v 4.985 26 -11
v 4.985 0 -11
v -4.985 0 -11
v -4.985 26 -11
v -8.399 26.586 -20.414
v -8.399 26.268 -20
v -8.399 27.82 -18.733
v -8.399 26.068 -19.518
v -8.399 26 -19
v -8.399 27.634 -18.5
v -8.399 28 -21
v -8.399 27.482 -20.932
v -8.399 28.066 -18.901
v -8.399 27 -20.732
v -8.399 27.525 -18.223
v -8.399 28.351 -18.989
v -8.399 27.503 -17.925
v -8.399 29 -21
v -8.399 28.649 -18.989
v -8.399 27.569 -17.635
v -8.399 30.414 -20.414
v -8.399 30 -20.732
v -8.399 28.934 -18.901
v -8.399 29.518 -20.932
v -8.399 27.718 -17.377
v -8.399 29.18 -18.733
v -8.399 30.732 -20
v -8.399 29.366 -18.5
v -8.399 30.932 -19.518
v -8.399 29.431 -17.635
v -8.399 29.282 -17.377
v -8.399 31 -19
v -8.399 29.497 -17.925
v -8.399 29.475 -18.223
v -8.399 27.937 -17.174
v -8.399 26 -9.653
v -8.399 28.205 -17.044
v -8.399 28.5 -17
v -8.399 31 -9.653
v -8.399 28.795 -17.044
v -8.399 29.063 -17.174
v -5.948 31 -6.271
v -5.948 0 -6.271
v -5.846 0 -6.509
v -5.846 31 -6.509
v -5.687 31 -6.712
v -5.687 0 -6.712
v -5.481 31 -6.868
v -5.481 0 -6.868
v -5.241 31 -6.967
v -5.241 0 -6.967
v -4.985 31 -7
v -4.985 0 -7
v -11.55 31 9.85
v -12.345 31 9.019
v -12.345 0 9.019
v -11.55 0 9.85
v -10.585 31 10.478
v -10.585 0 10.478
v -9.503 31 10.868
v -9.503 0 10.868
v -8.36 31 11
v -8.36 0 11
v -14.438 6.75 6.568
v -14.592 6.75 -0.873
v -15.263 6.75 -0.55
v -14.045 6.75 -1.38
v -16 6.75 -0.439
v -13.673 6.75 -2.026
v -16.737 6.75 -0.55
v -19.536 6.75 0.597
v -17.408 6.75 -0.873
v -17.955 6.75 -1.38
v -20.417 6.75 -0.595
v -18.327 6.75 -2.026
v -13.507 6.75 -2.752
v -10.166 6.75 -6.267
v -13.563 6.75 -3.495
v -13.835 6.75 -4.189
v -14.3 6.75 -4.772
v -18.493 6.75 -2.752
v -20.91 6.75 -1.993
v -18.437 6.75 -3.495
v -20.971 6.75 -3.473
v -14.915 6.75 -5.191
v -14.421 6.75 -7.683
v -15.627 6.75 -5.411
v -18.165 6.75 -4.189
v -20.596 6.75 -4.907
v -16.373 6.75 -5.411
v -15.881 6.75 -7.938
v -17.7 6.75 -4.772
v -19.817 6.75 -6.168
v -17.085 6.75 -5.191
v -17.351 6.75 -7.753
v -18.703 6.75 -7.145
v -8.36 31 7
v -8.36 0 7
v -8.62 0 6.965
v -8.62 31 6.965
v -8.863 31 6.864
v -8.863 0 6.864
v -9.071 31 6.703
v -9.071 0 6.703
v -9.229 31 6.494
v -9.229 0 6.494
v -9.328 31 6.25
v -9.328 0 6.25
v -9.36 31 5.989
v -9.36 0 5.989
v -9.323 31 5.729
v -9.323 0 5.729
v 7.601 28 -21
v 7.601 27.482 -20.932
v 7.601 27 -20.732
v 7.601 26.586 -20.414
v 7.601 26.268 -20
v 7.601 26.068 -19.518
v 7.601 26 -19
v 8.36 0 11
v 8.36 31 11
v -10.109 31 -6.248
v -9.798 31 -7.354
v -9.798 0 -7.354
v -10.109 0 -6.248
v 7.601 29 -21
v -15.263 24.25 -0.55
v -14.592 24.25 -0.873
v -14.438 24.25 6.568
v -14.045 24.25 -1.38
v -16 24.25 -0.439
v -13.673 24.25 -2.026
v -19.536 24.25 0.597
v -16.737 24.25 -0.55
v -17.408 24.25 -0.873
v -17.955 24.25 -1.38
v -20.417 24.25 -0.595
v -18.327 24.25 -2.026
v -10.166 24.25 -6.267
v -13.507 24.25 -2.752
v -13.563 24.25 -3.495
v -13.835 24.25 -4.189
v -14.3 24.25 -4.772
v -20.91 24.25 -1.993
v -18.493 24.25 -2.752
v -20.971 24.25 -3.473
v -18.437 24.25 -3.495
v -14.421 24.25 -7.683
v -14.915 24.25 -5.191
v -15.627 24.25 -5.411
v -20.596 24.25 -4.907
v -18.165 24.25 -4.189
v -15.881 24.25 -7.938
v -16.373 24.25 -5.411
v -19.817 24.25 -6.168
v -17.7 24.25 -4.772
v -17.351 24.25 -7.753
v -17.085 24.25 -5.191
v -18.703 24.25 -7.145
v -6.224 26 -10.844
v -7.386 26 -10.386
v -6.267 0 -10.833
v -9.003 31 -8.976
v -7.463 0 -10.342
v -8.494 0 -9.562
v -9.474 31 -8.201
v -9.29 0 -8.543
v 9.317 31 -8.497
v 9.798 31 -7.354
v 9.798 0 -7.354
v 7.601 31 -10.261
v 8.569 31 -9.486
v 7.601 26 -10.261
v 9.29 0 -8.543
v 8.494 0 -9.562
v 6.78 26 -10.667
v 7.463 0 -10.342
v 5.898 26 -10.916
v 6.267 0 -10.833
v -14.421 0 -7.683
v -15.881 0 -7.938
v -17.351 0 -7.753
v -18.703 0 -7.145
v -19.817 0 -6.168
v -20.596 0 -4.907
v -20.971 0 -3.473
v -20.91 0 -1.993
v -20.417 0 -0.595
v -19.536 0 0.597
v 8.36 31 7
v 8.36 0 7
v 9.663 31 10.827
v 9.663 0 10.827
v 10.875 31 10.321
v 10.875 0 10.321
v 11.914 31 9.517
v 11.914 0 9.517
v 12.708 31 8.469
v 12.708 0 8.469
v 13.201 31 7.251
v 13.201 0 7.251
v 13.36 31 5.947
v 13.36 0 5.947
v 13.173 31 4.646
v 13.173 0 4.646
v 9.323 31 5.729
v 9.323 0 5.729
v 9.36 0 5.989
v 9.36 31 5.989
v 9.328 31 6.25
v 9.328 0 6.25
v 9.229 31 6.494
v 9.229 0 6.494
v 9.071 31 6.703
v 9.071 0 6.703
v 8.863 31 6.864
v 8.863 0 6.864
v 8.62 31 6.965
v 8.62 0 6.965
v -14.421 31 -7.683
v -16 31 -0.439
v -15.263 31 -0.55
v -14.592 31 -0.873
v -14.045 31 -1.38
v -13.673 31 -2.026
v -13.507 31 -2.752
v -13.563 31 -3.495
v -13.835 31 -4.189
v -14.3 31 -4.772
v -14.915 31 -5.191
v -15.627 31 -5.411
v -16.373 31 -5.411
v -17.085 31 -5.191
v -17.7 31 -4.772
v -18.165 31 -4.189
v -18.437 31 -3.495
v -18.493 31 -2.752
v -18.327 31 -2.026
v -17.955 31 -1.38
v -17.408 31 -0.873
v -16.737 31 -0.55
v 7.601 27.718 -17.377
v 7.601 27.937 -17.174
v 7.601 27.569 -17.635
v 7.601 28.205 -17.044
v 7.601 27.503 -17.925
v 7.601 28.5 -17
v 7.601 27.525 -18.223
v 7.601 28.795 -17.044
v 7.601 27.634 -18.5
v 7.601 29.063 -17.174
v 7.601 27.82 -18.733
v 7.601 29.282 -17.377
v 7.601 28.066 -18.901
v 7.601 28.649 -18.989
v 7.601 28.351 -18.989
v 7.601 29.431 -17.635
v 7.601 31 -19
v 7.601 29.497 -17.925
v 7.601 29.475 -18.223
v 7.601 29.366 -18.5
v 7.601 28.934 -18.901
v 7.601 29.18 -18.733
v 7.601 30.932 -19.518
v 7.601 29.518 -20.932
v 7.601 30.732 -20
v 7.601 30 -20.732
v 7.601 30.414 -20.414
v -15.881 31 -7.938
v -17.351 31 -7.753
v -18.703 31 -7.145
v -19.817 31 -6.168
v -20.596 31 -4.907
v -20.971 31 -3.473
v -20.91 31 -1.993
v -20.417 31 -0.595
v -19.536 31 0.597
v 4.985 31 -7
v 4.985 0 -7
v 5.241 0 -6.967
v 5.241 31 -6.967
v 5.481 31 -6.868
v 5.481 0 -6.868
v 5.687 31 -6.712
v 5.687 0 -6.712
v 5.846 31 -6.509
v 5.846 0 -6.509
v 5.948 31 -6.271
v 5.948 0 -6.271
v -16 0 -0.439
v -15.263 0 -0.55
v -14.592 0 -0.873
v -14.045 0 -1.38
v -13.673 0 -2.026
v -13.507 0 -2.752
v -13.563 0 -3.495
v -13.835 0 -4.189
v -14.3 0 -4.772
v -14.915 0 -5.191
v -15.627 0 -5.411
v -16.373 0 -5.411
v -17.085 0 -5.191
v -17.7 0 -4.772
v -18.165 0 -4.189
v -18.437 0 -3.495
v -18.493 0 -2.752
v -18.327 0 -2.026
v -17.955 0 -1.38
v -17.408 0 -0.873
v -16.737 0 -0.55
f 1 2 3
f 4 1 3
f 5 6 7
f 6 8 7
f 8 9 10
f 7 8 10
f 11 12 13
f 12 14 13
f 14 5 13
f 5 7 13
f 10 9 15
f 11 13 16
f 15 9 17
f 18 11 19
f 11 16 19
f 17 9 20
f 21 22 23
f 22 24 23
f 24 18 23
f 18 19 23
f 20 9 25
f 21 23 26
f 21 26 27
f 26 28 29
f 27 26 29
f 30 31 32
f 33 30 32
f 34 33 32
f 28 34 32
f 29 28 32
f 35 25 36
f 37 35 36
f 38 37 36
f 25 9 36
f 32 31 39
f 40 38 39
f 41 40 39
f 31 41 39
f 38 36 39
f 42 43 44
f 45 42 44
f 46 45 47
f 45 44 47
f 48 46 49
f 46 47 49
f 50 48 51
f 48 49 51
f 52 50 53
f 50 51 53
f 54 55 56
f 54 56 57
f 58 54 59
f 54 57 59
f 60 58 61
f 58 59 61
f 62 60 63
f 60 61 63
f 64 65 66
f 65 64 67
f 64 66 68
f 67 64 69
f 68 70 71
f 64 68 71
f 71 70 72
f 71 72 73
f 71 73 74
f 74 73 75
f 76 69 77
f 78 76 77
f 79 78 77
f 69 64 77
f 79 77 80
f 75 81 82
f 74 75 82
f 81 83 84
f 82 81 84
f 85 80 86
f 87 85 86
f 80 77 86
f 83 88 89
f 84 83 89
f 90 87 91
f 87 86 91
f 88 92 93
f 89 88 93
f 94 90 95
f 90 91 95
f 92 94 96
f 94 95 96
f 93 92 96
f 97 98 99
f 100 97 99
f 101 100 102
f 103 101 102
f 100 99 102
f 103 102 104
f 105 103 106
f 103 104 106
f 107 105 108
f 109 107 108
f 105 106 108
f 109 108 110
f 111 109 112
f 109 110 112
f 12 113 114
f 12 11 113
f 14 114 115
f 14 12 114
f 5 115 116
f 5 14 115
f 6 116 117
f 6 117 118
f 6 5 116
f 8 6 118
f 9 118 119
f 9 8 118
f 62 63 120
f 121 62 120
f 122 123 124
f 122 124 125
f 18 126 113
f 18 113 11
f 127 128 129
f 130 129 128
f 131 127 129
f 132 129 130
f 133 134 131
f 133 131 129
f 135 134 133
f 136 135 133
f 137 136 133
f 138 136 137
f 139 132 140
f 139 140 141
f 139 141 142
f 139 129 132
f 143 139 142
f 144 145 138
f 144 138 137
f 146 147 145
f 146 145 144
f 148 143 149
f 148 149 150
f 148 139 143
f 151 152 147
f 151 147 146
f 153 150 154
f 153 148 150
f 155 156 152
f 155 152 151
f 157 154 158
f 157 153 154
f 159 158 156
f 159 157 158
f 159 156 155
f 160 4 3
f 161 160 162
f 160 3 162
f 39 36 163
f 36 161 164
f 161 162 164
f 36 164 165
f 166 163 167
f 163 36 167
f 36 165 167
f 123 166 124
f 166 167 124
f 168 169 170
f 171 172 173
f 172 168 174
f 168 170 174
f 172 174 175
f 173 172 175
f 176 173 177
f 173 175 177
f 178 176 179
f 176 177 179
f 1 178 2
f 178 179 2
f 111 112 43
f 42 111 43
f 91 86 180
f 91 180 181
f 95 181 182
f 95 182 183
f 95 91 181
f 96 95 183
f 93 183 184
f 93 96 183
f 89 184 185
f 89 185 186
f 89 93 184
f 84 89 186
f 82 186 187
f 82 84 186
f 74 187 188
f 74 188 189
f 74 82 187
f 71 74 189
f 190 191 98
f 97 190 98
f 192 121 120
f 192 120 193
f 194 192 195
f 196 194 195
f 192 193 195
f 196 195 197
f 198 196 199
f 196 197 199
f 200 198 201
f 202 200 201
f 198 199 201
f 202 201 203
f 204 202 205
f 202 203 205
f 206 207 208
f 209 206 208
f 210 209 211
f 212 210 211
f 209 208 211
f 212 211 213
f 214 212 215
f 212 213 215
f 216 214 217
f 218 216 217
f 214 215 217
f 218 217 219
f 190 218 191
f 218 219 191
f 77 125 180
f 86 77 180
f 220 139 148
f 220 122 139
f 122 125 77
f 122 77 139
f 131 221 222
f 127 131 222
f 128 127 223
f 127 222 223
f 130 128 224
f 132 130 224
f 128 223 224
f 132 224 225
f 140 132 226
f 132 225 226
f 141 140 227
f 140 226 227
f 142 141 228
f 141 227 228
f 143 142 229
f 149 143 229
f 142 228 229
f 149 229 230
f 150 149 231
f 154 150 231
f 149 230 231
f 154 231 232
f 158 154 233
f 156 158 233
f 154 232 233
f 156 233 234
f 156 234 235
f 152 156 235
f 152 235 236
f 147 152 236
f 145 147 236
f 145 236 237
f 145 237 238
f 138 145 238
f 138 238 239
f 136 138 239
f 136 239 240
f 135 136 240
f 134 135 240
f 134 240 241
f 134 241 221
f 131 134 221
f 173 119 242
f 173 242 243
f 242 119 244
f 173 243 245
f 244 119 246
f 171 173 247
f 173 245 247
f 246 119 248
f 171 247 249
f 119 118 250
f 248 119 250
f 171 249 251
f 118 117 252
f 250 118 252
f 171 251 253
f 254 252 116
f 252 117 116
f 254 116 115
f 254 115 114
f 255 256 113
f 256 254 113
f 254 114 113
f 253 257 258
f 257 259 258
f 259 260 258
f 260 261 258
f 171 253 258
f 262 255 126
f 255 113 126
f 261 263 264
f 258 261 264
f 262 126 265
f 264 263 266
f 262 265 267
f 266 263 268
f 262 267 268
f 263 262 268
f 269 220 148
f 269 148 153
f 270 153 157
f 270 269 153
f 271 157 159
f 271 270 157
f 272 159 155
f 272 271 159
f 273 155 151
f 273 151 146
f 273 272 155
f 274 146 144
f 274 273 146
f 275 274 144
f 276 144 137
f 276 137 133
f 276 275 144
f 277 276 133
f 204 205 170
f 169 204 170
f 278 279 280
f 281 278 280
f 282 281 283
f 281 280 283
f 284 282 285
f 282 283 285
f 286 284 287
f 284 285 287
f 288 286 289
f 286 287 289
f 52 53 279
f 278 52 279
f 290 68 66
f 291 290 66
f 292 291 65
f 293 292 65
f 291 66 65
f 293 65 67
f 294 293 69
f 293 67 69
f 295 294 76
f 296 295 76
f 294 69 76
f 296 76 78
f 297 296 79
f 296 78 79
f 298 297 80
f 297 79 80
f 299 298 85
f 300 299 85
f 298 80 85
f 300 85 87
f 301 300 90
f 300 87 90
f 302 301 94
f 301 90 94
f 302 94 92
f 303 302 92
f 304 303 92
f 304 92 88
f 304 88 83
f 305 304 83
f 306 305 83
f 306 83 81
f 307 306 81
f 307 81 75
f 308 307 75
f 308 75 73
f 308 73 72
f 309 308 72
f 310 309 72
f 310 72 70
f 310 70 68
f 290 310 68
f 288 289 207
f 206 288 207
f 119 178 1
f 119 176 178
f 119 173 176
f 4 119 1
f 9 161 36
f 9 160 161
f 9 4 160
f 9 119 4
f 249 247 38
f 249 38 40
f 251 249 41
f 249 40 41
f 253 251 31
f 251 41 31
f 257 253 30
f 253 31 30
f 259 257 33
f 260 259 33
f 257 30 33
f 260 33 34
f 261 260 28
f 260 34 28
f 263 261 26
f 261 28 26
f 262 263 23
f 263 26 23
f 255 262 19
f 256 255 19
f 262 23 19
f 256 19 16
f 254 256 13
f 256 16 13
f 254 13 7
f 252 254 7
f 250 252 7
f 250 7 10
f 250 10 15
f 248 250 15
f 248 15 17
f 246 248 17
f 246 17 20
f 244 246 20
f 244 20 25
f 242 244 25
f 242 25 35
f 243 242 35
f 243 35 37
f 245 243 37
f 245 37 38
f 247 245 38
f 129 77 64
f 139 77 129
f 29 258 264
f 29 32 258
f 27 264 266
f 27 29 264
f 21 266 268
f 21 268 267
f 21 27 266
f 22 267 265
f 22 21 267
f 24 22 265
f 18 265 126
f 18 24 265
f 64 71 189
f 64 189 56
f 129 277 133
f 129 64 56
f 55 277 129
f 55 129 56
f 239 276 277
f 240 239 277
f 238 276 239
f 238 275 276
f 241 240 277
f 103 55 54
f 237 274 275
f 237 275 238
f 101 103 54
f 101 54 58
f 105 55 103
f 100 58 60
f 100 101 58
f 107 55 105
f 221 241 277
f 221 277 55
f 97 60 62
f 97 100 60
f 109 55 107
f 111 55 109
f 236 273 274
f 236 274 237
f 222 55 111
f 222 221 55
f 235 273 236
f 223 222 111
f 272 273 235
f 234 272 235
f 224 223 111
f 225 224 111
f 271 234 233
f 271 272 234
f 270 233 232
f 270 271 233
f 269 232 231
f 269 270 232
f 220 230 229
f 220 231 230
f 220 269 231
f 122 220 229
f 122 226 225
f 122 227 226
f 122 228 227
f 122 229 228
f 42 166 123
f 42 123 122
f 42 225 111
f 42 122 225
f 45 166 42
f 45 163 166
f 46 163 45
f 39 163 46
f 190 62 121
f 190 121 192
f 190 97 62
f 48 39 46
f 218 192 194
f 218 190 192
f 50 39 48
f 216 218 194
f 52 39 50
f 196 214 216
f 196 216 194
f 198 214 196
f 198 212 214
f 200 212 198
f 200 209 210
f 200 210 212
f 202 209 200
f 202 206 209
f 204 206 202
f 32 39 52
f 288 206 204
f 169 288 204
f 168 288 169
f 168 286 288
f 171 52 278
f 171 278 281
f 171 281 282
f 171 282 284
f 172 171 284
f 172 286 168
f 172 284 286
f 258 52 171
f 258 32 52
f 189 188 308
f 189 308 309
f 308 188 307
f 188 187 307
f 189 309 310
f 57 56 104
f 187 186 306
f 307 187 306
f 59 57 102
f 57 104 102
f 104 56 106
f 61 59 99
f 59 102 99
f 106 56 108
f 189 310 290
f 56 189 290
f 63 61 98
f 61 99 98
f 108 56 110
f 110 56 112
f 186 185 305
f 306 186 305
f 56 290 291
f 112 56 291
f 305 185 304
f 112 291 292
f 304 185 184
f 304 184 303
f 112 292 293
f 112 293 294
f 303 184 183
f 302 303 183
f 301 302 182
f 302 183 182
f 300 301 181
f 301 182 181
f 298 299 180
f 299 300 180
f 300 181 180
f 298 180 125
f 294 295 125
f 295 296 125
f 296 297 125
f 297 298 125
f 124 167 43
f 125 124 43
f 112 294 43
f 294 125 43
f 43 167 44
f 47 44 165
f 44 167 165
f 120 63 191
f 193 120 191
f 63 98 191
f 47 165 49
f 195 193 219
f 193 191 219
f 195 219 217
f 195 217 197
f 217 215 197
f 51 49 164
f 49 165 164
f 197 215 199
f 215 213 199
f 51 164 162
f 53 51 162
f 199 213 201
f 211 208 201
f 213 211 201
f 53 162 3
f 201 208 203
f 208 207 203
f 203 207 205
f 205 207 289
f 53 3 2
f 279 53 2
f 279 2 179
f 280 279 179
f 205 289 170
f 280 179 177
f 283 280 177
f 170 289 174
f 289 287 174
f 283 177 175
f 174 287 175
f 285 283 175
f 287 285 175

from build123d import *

# Parameters (mm, degrees)
BOSS_EXTRUDE1_DEPTH             = 31
SKETCH2_W                       = 16
SKETCH2_H                       = 5
BOSS_EXTRUDE2_DEPTH             = 10
BOSS_EXTRUDE2_DIRECTION_2_REACH = 42.293
SKETCH3_R                       = 1
CUT_EXTRUDE1_DEPTH              = 44.306250579
FILLET1_R                       = 2
SKETCH4_R                       = 2.5
BOSS_EXTRUDE3_DEPTH             = 31
SKETCH6_W                       = 18.969126519
SKETCH6_H                       = 17.5
CUT_EXTRUDE2_DEPTH              = 43.163504997


with BuildPart() as part:
    # Sketch1 → Boss-Extrude1 (new body)
    with BuildSketch(Plane(origin=(0, 0, 0), x_dir=(1, 0, 0), z_dir=(0, 1, 0))):
        with BuildLine():
            Line((-8.359903733, -11), (8.359903733, -11))
            ThreePointArc((8.359903733, -11), (12.345417465, -9.01921849), (13.173158433, -4.646272115))
            Line((13.173158433, -4.646272115), (9.798158433, 7.353727885))
            ThreePointArc((9.798158433, 7.353727885), (8.004122222, 9.985513732), (4.984903733, 11))
            Line((4.984903733, 11), (-4.984903733, 11))
            ThreePointArc((-4.984903733, 11), (-8.004122222, 9.985513732), (-9.798158433, 7.353727885))
            Line((-9.798158433, 7.353727885), (-13.173158433, -4.646272115))
            ThreePointArc((-13.173158433, -4.646272115), (-12.345417465, -9.01921849), (-8.359903733, -11))
        make_face()
        with BuildLine():
            Line((5.947554673, 6.270745577), (9.322554673, -5.729254423))
            ThreePointArc((9.322554673, -5.729254423), (9.157006479, -6.603843698), (8.359903733, -7))
            Line((8.359903733, -7), (-8.359903733, -7))
            ThreePointArc((-8.359903733, -7), (-9.157006479, -6.603843698), (-9.322554673, -5.729254423))
            Line((-9.322554673, -5.729254423), (-5.947554673, 6.270745577))
            ThreePointArc((-5.947554673, 6.270745577), (-5.588747431, 6.797102746), (-4.984903733, 7))
            Line((-4.984903733, 7), (4.984903733, 7))
            ThreePointArc((4.984903733, 7), (5.588747431, 6.797102746), (5.947554673, 6.270745577))
        make_face(mode=Mode.SUBTRACT)
    extrude(amount=BOSS_EXTRUDE1_DEPTH)

    # Sketch2 → Boss-Extrude2 (add)
    with BuildSketch(Plane(origin=(0, 0, -11), x_dir=(-1, 0, 0), z_dir=(0, 0, -1))):
        with Locations((0.398573677, 28.5)):
            Rectangle(SKETCH2_W, SKETCH2_H)
    extrude(amount=BOSS_EXTRUDE2_DEPTH)

    # Boss-Extrude2 direction 2: up to this face of the body (flat: up to its plane)
    boss_extrude2_direction_2_end = Plane(part.part.faces().sort_by_distance((0, 15.5, -7))[0])
    # Sketch2 → Boss-Extrude2 direction 2 (add, up to the picked face)
    with BuildSketch(Plane(origin=(0, 0, -11), x_dir=(-1, 0, 0), z_dir=(0, 0, -1)), mode=Mode.PRIVATE) as boss_extrude2_direction_2_sk1:
        with Locations((0.398573677, 28.5)):
            Rectangle(SKETCH2_W, SKETCH2_H)
    boss_extrude2_direction_2_tool1 = split(extrude(boss_extrude2_direction_2_sk1.sketch, amount=-BOSS_EXTRUDE2_DIRECTION_2_REACH, mode=Mode.PRIVATE), bisect_by=boss_extrude2_direction_2_end, keep=Keep.BOTH, mode=Mode.PRIVATE)
    add(boss_extrude2_direction_2_tool1.solids().sort_by(Axis((-0.398574, 28.5, -11), (0, 0, 1)))[0])

    # Sketch3 → Cut-Extrude1 (cut, through all)
    with BuildSketch(Plane.ZY.offset(8.398573677)):
        with Locations((-18, 28.5)):
            Circle(SKETCH3_R)
    extrude(amount=-CUT_EXTRUDE1_DEPTH, mode=Mode.SUBTRACT)

    # Fillet1
    fillet1_edges = [part.edges().sort_by_distance(p)[0] for p in [
        (-0.398573677, 31, -21),
        (-0.398573677, 26, -21),
    ]]
    fillet(fillet1_edges, radius=FILLET1_R)

    # Sketch4 → Boss-Extrude3 (add, through all)
    with BuildSketch(Plane(origin=(0, 31, 0), x_dir=(1, 0, 0), z_dir=(0, 1, 0))):
        with BuildLine():
            Line((-19.535533906, -0.596593374), (-12.345417465, -9.01921849))
            Line((-12.345417465, -9.01921849), (-10.109189958, 6.247838019))
            Line((-10.109189958, 6.247838019), (-14.420879995, 7.683029487))
            ThreePointArc((-14.420879995, 7.683029487), (-20.253813291, 5.566690993), (-19.535533906, -0.596593374))
        make_face()
        with Locations(Location((-16, 2.938940532, 0), (0, 0, 270))):
            Circle(SKETCH4_R, mode=Mode.SUBTRACT)
    extrude(amount=-BOSS_EXTRUDE3_DEPTH)

    # Sketch6 → Cut-Extrude2 (cut, through all)
    with BuildSketch(Plane(origin=(0.863884459, 0, -2.595334559), x_dir=(-0.9488177909602633, 0, -0.31582400092026913), z_dir=(0.31582400092026913, 0, -0.9488177909602633))):
        with Locations((21.109272612, 15.5)):
            Rectangle(SKETCH6_W, SKETCH6_H)
    extrude(amount=-CUT_EXTRUDE2_DEPTH, mode=Mode.SUBTRACT)


solid = part.part
